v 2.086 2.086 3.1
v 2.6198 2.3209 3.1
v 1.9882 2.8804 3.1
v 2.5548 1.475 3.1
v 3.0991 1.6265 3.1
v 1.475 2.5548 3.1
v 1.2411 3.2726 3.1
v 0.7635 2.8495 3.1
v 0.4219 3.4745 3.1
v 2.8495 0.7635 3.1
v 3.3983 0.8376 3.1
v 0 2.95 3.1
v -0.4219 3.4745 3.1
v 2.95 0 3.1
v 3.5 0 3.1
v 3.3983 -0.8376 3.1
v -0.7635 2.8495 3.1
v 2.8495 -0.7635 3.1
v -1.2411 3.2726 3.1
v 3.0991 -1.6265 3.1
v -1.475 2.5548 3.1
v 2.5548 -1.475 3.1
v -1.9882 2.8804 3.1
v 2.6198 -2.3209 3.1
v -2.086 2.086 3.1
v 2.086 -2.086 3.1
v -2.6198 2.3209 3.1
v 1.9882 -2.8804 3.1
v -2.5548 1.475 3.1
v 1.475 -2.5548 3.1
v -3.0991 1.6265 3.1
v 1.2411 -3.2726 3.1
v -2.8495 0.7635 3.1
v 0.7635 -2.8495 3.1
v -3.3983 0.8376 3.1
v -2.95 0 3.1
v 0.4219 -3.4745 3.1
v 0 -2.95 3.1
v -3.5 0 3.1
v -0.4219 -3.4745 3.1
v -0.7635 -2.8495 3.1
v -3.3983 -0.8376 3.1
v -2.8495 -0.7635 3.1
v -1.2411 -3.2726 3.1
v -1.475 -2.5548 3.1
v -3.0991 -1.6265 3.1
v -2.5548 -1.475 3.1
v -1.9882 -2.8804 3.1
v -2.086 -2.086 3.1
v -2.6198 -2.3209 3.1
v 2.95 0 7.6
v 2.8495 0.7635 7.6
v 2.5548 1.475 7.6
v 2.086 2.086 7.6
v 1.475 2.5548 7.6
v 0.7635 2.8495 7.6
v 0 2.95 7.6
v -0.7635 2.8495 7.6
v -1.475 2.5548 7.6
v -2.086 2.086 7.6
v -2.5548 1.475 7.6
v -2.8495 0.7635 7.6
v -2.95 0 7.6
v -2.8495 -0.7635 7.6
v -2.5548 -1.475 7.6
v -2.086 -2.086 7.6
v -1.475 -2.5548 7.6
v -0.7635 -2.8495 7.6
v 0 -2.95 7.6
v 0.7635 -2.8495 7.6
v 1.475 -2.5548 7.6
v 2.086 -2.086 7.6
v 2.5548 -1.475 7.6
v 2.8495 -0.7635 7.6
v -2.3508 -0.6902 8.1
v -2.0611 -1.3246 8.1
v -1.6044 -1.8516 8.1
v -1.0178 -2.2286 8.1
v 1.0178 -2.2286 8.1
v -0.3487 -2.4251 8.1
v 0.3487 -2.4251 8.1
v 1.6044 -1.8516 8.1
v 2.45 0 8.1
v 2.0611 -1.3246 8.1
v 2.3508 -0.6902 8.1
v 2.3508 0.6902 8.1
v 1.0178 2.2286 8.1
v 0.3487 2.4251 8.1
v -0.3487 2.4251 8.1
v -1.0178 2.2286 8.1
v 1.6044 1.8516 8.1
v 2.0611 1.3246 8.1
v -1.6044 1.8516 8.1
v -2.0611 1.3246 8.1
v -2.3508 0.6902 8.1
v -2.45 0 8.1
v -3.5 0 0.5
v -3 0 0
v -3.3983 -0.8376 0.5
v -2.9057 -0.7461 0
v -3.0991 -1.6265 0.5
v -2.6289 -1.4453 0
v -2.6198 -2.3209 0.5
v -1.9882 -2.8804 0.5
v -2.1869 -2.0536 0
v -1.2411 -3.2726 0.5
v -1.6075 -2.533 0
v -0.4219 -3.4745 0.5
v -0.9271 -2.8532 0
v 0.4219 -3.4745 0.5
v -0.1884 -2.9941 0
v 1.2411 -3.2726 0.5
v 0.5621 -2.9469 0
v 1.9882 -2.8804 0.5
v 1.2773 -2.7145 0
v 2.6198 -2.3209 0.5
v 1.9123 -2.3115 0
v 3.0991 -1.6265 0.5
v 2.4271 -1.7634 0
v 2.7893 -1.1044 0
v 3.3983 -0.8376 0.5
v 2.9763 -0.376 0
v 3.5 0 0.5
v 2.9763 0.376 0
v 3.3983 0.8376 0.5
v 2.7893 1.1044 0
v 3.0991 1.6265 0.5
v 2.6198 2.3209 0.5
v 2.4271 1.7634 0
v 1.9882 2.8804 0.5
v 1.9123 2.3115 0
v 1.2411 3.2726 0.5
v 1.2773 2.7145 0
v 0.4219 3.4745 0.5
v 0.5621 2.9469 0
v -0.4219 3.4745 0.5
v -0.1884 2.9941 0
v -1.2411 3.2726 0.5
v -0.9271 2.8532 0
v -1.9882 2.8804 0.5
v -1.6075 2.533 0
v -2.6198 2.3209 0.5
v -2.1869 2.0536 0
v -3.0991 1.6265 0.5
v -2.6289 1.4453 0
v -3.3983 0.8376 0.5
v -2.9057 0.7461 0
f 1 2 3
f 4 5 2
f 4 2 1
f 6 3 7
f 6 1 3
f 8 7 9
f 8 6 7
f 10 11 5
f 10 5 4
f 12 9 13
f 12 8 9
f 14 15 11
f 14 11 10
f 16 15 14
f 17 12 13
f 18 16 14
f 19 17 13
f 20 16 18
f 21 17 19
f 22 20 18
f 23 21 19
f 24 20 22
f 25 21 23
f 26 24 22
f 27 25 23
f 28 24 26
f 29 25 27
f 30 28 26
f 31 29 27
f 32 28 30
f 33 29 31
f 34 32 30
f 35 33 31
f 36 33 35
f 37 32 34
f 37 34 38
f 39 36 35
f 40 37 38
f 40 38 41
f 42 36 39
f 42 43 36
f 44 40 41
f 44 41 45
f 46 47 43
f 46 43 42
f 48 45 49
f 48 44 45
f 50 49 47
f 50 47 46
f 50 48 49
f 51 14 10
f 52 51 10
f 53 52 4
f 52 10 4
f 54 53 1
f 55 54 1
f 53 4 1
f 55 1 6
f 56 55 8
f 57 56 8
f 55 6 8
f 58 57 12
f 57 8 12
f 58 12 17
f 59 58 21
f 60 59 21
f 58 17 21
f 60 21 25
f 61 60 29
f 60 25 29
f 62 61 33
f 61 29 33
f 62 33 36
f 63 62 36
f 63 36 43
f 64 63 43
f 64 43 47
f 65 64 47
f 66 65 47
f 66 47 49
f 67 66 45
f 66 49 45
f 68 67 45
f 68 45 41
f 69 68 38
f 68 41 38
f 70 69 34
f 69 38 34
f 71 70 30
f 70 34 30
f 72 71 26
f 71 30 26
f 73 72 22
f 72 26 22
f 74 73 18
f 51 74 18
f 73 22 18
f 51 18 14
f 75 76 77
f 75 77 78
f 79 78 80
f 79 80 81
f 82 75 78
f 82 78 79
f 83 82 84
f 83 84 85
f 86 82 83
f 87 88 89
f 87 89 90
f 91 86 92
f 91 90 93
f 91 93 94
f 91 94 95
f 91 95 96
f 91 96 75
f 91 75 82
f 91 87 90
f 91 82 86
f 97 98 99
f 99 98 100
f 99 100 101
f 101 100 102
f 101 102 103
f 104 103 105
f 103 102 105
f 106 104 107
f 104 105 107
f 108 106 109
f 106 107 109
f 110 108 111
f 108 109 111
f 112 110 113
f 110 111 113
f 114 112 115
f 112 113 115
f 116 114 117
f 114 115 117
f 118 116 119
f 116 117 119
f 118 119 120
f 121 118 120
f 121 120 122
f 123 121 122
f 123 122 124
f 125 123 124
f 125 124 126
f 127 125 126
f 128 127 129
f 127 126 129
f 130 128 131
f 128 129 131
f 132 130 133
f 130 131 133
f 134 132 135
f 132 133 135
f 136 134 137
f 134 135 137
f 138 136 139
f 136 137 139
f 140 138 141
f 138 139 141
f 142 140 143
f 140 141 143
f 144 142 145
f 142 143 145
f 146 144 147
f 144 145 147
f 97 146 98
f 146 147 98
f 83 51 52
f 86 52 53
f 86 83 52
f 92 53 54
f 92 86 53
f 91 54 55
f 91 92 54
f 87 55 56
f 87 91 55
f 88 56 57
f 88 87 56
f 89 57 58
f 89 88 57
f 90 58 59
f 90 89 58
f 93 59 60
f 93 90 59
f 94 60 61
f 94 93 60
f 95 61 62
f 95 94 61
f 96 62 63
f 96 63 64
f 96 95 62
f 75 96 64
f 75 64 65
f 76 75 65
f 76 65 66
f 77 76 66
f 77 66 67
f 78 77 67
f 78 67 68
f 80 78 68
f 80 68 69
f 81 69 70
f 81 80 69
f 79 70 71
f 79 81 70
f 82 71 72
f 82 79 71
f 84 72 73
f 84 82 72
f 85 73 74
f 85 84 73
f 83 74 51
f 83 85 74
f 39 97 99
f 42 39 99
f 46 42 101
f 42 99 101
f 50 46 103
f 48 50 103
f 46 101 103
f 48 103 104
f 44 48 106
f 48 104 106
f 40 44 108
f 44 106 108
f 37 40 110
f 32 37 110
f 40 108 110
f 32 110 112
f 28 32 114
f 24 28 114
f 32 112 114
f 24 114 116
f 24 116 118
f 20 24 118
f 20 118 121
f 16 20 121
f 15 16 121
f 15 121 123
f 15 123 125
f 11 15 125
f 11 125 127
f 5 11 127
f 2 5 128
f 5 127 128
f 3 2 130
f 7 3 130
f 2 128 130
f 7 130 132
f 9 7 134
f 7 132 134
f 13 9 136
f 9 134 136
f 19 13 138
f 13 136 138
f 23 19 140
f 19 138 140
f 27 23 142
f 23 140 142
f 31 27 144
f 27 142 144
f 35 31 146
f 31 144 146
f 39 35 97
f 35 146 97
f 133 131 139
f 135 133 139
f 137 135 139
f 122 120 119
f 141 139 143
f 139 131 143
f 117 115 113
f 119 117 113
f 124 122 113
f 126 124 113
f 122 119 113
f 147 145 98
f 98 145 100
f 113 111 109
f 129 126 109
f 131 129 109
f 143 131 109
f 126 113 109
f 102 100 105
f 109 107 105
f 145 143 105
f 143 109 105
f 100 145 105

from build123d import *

# Parameters (mm, degrees)
SKETCH_1_R      = 3.5
EXTRUDE_1_DEPTH = 3.1
SKETCH_2_R      = 2.95
EXTRUDE_2_DEPTH = 5
CHAMFER_1_SIZE  = 0.5


with BuildPart() as part:
    # 草图1 → 拉伸1 (new body)
    with BuildSketch(Plane.XY):
        with Locations(Location((0, 0, 0), (0, 0, 180))):
            Circle(SKETCH_1_R)
    extrude(amount=EXTRUDE_1_DEPTH)

    # 草图2 → 拉伸2 (add)
    with BuildSketch(Plane.XY.offset(3.1)):
        Circle(SKETCH_2_R)
    extrude(amount=EXTRUDE_2_DEPTH)

    # 倒角1
    chamfer_1_edges = [part.edges().sort_by_distance(p)[0] for p in [
        (3.5, 0, 0),
        (-2.95, 0, 8.1),
    ]]
    chamfer(chamfer_1_edges, length=CHAMFER_1_SIZE)


solid = part.part
